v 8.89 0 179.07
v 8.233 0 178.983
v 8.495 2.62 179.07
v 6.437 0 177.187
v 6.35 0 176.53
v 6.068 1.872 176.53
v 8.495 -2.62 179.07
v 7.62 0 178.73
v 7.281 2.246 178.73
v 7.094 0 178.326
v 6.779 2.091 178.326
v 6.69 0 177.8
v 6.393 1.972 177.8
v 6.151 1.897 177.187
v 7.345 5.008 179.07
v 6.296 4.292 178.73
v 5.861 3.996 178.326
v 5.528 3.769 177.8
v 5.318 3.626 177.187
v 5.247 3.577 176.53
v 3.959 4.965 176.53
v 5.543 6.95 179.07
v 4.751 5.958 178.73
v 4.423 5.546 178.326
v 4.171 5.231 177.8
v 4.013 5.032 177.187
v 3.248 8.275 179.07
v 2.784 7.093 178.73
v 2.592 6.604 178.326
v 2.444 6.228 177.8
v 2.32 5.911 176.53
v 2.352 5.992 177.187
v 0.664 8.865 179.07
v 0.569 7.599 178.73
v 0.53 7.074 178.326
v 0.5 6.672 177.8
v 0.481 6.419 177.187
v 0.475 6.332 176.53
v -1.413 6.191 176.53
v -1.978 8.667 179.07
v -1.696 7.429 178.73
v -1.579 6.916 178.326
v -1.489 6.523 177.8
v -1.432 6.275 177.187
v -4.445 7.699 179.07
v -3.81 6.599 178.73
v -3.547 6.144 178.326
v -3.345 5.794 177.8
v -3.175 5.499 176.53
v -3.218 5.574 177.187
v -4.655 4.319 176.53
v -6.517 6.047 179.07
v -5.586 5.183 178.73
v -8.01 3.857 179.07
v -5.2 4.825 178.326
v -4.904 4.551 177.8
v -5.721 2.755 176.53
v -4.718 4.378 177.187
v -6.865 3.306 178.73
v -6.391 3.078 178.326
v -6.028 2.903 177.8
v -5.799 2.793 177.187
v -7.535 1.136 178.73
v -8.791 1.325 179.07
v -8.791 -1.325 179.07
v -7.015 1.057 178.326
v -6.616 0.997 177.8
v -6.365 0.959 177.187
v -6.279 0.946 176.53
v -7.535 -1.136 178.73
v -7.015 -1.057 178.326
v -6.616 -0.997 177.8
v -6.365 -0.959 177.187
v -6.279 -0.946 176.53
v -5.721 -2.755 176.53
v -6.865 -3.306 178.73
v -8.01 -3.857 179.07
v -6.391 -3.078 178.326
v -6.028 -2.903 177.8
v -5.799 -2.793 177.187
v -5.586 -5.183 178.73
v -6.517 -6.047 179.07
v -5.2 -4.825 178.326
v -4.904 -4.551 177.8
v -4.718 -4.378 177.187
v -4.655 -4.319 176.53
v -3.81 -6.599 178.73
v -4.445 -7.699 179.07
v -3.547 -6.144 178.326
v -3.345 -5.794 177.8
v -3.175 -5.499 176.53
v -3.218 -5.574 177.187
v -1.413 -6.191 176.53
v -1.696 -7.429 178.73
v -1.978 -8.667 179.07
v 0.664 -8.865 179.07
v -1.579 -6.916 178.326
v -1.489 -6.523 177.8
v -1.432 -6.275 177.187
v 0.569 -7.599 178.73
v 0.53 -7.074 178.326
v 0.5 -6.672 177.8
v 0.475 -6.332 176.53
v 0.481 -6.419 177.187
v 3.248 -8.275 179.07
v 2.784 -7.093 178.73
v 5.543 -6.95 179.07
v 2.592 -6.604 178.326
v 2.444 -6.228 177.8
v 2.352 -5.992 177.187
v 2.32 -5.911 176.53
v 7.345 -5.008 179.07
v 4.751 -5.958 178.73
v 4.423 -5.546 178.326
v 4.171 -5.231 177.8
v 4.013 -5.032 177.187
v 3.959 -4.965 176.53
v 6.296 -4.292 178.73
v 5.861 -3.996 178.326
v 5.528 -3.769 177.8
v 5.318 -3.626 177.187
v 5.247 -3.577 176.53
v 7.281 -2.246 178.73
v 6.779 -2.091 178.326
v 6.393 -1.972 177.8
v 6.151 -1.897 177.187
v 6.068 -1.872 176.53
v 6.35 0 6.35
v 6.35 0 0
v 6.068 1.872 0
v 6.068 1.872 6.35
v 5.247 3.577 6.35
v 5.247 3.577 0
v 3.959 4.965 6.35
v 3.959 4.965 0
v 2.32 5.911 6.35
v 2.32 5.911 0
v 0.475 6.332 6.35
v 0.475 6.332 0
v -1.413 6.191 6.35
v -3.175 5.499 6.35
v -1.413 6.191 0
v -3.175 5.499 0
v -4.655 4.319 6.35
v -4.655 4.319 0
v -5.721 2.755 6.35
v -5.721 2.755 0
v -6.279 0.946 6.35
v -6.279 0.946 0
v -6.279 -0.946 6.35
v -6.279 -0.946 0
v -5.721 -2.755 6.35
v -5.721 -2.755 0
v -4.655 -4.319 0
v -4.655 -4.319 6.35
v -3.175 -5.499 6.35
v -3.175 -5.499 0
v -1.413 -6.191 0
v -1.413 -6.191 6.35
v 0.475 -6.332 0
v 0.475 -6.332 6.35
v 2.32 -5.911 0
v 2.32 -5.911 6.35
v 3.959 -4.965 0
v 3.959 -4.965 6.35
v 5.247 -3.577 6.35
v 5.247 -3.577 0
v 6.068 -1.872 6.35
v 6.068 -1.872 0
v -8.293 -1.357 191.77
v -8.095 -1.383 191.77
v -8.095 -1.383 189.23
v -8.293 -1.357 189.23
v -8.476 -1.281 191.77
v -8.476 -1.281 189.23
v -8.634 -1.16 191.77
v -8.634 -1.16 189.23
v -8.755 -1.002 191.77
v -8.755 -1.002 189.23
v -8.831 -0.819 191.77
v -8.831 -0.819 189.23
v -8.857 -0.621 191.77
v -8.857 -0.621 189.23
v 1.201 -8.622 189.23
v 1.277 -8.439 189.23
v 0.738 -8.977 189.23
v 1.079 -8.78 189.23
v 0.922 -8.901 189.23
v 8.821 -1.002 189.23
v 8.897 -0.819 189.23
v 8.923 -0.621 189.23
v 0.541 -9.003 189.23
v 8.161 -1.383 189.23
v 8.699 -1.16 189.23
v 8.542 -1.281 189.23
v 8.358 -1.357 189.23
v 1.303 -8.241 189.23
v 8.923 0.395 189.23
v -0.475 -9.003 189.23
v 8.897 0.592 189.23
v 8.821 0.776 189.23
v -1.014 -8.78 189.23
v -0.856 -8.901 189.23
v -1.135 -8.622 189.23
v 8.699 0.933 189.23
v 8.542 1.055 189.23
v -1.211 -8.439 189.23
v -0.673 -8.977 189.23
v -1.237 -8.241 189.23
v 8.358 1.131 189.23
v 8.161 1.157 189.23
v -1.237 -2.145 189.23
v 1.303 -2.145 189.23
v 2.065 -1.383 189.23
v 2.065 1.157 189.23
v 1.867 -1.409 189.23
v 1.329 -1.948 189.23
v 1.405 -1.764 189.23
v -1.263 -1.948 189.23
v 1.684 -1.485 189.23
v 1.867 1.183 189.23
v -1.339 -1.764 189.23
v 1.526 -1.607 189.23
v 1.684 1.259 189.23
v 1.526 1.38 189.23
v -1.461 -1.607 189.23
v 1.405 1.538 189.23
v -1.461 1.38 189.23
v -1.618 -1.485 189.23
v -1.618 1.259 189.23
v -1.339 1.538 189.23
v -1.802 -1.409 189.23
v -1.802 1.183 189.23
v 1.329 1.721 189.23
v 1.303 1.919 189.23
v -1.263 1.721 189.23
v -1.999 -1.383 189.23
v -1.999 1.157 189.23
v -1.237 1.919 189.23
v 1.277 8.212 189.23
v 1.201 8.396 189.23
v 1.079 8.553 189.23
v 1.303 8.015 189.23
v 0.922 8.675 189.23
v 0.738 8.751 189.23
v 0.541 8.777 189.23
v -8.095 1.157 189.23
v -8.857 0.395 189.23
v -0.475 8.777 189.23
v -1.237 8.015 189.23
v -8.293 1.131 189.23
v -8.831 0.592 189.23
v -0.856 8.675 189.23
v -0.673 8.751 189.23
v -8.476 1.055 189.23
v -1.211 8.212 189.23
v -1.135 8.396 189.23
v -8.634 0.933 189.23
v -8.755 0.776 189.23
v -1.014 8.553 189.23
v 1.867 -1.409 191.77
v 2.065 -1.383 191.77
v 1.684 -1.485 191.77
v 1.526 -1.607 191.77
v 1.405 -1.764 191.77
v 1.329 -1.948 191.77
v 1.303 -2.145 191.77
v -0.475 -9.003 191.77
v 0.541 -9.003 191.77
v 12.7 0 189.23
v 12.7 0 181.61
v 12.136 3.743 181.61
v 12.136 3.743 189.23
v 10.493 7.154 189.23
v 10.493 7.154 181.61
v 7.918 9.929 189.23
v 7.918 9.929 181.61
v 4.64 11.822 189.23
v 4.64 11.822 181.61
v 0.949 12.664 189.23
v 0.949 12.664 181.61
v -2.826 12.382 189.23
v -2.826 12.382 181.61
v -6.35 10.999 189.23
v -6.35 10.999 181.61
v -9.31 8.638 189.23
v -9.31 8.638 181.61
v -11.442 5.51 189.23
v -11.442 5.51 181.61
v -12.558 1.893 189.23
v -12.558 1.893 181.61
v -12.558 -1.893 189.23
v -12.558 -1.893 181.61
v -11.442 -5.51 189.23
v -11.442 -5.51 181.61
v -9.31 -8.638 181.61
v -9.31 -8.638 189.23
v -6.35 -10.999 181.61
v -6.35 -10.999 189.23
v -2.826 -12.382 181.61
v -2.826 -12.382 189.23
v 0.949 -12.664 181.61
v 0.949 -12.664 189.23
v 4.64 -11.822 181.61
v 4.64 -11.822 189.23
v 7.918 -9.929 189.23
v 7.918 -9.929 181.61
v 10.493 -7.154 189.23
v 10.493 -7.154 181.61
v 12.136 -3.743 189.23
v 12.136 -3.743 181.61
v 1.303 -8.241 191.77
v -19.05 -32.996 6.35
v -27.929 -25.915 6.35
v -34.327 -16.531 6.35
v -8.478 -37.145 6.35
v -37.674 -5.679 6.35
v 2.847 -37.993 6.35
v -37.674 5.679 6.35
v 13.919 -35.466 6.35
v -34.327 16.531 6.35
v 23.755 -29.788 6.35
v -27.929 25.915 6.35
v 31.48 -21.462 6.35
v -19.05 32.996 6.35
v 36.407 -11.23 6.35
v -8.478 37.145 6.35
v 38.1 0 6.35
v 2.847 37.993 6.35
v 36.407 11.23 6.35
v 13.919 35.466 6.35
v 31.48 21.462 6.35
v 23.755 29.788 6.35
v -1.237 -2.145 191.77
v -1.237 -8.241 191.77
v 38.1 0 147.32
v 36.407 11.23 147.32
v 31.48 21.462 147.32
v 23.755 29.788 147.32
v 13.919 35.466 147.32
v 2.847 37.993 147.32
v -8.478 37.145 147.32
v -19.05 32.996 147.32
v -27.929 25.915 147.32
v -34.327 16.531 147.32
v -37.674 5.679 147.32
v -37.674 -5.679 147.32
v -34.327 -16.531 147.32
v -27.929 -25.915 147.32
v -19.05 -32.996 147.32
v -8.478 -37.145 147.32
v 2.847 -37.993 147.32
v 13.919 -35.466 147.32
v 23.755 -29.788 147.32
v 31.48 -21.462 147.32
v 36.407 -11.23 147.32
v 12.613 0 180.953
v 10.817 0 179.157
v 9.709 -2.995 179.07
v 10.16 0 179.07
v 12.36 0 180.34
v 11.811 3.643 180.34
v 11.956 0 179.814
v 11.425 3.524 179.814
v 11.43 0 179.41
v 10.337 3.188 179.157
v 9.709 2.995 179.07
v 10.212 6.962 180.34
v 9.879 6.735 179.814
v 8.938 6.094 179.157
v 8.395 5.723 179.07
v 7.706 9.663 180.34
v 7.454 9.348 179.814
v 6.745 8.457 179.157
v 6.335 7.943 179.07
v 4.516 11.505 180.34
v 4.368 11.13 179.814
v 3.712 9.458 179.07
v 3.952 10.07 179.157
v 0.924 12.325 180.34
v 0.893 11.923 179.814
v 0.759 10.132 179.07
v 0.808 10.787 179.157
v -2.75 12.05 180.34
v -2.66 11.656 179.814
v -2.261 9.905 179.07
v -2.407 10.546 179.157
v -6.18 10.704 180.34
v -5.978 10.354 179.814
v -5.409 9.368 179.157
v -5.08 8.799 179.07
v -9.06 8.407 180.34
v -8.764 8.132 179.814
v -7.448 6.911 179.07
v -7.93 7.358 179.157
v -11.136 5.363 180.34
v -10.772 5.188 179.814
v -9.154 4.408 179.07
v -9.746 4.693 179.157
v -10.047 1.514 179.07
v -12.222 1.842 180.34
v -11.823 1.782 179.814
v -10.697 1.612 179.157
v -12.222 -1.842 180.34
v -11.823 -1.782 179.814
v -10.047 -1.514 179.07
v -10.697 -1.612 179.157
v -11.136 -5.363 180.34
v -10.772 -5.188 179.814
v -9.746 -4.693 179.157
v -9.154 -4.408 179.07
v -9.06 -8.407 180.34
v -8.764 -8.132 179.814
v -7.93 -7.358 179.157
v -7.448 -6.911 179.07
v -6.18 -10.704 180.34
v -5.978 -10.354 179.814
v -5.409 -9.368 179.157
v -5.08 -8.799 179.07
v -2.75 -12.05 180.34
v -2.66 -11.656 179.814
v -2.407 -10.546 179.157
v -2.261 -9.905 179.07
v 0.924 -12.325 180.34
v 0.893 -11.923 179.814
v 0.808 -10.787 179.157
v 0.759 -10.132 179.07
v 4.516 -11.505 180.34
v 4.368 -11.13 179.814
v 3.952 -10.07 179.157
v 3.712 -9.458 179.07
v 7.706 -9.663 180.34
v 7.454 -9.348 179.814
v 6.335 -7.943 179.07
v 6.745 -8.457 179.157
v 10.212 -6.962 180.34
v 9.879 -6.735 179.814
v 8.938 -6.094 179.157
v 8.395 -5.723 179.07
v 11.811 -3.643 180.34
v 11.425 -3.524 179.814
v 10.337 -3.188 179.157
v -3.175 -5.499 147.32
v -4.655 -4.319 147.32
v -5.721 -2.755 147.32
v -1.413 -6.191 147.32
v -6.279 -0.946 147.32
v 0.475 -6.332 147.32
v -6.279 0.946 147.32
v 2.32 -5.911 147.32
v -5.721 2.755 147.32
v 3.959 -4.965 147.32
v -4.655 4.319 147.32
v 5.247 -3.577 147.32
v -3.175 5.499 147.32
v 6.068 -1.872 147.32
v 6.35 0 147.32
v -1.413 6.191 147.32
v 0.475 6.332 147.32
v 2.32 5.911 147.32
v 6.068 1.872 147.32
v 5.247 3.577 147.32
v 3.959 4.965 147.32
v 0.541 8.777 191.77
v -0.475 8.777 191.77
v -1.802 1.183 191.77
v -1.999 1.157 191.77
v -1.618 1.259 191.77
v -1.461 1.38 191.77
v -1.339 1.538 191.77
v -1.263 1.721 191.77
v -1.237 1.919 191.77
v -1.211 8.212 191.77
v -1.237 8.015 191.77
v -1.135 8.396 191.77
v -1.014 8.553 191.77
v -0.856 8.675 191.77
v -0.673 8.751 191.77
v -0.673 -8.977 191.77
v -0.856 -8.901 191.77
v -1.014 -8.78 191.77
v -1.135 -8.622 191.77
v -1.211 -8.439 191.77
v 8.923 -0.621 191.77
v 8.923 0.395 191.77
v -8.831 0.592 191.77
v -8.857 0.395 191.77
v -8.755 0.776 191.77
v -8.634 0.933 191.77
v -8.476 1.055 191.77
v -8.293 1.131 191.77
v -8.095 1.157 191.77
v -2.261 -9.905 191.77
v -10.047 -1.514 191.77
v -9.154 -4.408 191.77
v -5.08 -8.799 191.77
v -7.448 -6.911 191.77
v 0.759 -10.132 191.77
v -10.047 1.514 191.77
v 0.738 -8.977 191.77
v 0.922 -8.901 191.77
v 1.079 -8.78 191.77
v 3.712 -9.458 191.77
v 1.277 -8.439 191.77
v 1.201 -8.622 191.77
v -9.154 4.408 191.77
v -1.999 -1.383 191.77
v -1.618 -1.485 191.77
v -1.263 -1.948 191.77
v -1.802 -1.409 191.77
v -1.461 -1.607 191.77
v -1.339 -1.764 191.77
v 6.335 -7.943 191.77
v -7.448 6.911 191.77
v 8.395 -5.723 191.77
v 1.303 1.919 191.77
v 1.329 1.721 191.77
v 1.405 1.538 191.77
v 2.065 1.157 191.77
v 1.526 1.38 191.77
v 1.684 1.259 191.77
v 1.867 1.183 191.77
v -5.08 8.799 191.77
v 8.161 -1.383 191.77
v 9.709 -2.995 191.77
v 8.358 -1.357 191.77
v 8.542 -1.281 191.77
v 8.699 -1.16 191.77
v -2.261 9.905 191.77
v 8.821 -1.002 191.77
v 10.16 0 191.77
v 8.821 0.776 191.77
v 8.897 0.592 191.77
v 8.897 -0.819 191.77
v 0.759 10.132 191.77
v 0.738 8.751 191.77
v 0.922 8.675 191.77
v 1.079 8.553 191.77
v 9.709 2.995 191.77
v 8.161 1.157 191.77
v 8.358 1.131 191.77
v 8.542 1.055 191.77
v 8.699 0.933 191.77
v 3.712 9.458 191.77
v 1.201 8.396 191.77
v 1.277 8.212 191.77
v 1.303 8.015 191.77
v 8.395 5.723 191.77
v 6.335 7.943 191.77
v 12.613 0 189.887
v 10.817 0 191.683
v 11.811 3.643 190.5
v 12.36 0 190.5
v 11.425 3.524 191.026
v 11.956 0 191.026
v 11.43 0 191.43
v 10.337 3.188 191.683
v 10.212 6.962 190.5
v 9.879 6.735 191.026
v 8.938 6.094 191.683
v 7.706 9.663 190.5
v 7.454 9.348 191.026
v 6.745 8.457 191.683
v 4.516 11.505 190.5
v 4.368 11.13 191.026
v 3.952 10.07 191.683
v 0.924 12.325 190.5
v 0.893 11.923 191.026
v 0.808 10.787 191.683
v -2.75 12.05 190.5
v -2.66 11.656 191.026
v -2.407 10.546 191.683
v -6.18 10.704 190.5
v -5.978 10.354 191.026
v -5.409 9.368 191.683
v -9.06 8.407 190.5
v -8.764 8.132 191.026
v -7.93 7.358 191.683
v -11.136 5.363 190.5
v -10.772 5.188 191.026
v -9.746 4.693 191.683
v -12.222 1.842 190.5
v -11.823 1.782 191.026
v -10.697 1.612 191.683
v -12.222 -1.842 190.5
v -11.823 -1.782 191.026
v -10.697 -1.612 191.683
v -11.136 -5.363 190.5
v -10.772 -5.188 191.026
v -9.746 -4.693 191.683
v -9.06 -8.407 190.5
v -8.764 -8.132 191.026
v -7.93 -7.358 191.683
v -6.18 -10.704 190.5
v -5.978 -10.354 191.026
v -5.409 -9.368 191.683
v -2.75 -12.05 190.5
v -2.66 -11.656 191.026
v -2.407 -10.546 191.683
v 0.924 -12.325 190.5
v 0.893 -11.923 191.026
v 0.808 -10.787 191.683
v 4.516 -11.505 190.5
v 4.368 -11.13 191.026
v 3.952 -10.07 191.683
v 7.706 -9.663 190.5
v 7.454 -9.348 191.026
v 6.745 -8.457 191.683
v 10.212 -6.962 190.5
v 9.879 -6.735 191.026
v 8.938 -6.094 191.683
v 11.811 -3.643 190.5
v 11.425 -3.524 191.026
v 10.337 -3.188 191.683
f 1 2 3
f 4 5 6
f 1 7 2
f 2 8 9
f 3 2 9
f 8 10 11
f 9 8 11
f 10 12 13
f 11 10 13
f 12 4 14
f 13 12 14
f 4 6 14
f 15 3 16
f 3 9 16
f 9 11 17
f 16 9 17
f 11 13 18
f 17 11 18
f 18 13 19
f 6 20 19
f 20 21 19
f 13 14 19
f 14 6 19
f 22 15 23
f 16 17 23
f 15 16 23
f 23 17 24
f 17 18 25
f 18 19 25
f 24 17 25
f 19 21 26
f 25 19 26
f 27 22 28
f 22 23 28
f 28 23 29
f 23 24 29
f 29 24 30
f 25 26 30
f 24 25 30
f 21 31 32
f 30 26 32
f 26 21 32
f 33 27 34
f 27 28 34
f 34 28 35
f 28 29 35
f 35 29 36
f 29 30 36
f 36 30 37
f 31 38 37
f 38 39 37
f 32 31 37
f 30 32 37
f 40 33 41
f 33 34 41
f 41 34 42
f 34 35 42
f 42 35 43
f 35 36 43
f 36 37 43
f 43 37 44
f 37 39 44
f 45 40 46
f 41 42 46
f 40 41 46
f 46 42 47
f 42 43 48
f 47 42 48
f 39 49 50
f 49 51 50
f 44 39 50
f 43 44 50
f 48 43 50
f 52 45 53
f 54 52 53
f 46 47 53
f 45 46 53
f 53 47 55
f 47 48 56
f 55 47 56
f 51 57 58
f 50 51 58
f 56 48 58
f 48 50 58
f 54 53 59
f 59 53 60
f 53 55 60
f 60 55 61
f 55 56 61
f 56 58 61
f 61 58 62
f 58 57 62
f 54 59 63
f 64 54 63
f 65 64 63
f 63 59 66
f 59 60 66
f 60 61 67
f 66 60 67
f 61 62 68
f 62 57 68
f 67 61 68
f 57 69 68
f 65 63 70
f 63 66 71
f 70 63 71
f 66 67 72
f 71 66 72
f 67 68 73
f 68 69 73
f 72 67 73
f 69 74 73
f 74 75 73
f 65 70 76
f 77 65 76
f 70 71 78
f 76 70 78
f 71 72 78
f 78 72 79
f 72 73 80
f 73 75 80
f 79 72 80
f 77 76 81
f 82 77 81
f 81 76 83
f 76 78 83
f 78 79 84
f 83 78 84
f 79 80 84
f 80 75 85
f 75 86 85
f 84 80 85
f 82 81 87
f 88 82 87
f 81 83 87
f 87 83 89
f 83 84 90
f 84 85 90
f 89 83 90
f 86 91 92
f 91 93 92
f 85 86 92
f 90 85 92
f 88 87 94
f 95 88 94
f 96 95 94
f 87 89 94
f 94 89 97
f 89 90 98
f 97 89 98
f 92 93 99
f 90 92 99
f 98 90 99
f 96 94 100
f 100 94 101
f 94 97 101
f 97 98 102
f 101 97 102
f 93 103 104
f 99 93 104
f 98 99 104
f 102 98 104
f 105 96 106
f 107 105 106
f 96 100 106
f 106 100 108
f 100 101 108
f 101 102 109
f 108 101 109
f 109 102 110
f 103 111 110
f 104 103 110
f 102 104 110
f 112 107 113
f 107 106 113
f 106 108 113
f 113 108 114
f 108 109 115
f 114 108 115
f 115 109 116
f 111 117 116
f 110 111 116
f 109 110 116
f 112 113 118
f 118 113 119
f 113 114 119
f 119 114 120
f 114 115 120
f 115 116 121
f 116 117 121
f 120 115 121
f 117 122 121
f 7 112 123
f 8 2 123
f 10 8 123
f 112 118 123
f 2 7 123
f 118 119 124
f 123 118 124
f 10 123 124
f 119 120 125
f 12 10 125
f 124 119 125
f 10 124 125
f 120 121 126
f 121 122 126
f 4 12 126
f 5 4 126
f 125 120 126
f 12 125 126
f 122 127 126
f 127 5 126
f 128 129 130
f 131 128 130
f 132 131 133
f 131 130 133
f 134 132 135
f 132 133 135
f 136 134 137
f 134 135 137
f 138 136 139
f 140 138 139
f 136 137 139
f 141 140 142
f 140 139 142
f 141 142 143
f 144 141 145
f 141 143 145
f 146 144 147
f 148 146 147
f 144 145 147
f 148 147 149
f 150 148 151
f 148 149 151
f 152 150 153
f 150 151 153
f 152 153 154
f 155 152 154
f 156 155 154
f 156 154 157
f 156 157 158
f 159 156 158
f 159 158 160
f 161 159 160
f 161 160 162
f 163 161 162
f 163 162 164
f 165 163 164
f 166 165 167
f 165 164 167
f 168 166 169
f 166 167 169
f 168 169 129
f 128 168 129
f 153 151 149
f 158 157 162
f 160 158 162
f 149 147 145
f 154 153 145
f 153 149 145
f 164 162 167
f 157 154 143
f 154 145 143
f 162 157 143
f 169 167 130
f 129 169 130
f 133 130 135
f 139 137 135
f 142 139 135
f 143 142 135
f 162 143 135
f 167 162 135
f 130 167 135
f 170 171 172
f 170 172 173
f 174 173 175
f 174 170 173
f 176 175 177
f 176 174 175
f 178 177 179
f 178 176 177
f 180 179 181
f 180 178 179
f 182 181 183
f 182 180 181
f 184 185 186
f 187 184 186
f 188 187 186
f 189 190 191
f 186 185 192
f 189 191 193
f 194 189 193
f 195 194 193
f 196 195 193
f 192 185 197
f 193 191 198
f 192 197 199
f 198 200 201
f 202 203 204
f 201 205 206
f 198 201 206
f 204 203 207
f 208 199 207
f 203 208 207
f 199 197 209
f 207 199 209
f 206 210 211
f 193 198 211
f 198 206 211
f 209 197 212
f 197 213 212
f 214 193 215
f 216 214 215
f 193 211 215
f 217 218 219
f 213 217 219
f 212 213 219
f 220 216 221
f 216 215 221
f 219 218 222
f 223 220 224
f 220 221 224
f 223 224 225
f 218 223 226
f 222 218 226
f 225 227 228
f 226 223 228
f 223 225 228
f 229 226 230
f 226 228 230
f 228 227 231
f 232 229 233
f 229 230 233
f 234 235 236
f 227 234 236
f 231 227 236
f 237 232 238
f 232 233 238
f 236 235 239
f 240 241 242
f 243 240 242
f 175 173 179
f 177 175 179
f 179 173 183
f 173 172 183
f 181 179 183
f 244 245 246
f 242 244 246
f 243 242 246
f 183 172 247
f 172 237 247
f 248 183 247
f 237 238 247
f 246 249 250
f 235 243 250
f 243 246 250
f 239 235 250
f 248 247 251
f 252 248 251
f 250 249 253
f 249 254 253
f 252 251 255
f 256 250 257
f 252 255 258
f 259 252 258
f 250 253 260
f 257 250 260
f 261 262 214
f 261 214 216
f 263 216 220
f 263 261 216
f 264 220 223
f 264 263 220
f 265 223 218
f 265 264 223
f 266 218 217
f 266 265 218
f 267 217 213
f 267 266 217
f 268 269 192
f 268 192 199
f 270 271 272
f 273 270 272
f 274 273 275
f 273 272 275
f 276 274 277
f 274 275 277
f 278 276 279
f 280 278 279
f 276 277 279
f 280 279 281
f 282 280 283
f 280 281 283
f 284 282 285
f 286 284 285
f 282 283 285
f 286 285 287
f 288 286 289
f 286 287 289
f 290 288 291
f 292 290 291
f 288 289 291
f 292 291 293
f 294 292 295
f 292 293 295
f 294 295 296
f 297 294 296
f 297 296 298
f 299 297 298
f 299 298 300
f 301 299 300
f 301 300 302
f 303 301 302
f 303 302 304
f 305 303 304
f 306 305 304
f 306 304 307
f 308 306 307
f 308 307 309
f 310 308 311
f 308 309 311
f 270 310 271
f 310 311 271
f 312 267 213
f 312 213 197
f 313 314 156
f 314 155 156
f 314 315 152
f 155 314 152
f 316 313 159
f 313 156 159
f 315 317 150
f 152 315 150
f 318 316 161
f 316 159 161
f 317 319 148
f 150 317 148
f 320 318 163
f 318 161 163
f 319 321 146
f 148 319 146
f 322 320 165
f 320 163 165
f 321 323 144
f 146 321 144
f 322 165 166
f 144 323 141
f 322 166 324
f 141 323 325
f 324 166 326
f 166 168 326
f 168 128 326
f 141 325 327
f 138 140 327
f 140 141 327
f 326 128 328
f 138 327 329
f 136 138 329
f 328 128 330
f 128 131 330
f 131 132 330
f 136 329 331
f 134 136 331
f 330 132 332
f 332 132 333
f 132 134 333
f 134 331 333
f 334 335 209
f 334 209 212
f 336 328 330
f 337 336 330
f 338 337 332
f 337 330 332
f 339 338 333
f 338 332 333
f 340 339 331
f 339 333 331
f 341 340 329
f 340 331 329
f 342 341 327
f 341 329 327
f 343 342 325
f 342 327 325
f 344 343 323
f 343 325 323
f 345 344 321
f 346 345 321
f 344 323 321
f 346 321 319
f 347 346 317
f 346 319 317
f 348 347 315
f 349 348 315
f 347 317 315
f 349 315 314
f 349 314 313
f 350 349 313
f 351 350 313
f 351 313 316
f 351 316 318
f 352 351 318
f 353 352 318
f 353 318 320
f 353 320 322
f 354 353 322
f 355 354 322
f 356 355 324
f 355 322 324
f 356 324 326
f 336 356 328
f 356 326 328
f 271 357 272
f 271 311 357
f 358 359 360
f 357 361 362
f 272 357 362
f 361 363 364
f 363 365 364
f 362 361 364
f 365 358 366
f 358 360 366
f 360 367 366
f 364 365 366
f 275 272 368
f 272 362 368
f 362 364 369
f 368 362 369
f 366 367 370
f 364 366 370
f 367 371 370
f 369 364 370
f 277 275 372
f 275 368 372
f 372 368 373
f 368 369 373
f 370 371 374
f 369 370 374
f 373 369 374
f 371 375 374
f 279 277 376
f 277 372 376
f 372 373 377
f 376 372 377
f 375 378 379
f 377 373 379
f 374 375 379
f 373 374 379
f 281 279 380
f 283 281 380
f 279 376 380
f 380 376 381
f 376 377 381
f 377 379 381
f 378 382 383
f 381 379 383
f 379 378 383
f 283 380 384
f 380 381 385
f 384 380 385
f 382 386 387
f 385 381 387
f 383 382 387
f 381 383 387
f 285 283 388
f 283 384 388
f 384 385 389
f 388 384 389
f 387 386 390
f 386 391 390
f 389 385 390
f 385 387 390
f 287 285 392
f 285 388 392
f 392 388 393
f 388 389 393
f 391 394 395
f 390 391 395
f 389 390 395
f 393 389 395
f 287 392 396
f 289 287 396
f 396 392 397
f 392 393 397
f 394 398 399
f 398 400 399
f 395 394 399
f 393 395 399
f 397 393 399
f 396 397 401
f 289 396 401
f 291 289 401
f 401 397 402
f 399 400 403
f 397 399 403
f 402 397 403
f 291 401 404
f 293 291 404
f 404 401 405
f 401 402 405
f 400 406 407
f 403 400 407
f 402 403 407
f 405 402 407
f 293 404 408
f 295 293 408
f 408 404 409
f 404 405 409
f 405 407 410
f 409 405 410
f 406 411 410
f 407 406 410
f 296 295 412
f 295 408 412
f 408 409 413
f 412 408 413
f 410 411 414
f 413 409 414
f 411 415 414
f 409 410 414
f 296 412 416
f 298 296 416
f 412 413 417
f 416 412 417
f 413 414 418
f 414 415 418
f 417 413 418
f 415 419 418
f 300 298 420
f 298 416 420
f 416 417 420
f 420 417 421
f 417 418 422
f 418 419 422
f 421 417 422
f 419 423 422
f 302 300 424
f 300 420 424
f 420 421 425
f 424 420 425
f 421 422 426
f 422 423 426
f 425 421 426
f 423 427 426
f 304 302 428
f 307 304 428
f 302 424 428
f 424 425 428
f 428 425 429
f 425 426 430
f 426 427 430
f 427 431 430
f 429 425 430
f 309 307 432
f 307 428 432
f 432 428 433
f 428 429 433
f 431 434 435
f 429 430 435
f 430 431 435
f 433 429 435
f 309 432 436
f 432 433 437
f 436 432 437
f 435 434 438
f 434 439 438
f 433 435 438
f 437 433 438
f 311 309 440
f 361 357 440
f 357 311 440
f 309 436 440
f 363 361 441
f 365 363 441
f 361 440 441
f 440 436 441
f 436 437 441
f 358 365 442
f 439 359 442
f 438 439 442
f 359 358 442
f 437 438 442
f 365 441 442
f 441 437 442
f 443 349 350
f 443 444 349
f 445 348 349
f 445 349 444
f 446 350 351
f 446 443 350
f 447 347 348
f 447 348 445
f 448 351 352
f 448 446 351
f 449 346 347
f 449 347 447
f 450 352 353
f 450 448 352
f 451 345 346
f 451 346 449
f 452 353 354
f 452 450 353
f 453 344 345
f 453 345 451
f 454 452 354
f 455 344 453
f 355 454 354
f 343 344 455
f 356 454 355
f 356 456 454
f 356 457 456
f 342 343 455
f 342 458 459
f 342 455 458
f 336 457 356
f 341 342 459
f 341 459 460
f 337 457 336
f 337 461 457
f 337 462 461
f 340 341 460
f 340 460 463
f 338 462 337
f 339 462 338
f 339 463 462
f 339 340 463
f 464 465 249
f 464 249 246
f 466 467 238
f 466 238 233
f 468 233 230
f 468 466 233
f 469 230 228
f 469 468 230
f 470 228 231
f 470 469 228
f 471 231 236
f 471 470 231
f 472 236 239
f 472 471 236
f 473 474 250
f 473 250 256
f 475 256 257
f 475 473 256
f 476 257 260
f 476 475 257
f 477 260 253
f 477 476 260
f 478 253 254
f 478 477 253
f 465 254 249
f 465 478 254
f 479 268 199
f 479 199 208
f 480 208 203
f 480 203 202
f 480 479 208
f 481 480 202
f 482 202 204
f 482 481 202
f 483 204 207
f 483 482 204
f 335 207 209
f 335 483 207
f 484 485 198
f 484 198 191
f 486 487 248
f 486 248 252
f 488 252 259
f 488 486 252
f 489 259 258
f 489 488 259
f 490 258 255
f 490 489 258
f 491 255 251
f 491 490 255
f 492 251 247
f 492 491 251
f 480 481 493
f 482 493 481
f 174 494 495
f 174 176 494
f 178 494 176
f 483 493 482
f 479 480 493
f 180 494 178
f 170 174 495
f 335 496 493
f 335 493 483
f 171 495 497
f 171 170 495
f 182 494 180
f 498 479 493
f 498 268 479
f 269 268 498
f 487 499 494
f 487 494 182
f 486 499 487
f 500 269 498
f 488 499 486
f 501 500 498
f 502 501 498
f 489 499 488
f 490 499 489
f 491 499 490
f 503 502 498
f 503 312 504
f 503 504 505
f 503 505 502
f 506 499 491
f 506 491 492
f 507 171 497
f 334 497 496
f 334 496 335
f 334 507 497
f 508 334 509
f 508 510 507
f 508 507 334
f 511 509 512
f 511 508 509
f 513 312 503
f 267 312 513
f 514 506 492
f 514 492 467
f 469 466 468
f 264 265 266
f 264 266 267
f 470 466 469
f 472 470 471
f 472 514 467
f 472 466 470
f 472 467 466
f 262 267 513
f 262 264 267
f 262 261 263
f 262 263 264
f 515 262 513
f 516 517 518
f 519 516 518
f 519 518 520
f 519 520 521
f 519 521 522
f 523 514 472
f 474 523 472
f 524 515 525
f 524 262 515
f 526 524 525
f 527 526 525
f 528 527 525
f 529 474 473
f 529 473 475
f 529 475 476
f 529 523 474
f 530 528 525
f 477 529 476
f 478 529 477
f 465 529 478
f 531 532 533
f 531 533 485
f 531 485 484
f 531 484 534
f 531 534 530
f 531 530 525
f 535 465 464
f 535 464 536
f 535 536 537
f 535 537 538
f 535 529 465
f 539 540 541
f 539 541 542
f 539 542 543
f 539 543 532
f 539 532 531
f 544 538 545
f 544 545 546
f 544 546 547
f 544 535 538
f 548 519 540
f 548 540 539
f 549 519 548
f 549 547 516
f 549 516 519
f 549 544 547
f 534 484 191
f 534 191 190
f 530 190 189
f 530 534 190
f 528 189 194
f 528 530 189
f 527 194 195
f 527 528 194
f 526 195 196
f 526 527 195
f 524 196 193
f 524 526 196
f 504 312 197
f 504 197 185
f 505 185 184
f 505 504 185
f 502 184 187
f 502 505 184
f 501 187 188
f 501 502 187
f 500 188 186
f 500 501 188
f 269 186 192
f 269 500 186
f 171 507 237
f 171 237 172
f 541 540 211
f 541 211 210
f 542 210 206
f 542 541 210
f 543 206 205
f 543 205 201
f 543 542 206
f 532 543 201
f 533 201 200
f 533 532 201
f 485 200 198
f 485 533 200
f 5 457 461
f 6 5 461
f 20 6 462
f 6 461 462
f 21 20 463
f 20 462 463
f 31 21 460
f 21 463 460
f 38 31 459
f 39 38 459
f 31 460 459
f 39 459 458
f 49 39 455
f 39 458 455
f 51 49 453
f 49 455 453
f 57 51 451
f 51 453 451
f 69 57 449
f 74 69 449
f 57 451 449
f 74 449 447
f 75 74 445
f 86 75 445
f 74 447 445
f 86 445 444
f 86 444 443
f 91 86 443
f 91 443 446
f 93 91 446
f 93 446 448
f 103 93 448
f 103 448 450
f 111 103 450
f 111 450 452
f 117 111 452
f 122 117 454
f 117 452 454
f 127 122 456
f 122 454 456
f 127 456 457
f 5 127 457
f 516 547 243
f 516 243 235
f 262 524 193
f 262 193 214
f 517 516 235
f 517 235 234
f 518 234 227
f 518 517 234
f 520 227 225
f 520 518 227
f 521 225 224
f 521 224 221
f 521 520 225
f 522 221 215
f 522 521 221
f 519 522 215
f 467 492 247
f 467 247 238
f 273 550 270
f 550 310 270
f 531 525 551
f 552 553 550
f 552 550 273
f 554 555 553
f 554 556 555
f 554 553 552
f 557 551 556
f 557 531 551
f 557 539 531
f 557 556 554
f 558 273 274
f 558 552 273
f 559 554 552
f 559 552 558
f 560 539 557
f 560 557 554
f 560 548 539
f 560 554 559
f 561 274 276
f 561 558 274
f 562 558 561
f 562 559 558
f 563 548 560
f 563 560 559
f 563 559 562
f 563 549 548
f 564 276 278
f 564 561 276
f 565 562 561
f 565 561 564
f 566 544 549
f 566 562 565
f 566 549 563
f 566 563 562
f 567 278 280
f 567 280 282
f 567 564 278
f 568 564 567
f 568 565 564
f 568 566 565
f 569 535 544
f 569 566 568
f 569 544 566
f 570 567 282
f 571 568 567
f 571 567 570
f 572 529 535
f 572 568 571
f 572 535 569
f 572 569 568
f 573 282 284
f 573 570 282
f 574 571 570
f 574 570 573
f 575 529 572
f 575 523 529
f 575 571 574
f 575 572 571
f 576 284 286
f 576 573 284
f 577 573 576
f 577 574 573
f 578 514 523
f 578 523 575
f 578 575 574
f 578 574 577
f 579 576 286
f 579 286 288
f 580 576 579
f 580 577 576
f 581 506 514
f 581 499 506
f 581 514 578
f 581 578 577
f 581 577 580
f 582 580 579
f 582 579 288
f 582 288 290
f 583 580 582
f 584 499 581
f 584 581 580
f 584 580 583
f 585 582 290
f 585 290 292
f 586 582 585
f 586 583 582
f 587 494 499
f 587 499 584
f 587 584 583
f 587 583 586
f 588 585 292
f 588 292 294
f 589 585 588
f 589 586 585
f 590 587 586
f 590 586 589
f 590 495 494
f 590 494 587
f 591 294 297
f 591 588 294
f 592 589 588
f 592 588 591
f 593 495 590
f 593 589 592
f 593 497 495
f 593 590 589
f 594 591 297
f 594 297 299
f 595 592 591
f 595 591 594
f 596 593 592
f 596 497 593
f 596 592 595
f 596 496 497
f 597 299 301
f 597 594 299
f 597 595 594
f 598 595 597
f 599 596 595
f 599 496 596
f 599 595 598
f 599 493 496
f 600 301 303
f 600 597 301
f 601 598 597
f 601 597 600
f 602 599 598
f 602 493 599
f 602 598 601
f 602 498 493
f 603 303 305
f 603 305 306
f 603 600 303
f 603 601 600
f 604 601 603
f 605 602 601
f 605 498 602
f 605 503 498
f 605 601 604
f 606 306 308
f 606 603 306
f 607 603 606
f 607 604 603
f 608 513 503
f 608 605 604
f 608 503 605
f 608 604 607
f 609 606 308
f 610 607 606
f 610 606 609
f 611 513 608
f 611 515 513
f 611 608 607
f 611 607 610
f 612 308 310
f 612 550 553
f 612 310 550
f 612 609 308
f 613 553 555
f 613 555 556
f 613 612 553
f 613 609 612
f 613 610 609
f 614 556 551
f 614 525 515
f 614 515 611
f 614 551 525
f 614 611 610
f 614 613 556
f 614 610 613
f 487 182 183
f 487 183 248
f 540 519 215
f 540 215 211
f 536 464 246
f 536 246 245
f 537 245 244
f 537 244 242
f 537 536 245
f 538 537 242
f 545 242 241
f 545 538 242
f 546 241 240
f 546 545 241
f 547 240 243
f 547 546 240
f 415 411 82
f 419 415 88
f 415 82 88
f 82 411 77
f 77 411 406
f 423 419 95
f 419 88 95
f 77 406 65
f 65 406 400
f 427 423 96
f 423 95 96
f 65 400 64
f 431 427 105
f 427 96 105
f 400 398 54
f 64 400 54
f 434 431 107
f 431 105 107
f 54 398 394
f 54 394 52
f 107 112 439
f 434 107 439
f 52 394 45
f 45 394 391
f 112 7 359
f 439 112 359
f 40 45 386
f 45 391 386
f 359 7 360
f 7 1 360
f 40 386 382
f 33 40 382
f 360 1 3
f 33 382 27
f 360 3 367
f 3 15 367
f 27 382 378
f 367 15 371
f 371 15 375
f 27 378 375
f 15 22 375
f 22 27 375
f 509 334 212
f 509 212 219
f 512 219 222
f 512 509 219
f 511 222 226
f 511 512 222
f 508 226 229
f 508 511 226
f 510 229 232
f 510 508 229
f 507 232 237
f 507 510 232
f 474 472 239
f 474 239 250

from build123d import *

# Parameters (mm, degrees)
SKETCH1_R           = 6.35
BOSS_EXTRUDE1_DEPTH = 6.35
SKETCH2_R           = 38.1
BOSS_EXTRUDE2_DEPTH = 140.97
SKETCH3_R           = 6.35
BOSS_EXTRUDE3_DEPTH = 31.75
SKETCH4_R           = 12.7
BOSS_EXTRUDE4_DEPTH = 12.7
FILLET1_R           = 2.54
CUT_EXTRUDE1_DEPTH  = 2.54


with BuildPart() as part:
    # Sketch1 → Boss-Extrude1 (new body)
    with BuildSketch(Plane.XY):
        Circle(SKETCH1_R)
    extrude(amount=BOSS_EXTRUDE1_DEPTH)

    # Sketch2 → Boss-Extrude2 (add)
    with BuildSketch(Plane.XY.offset(6.35)):
        Circle(SKETCH2_R)
    extrude(amount=BOSS_EXTRUDE2_DEPTH)

    # Sketch3 → Boss-Extrude3 (add)
    with BuildSketch(Plane.XY.offset(147.32)):
        Circle(SKETCH3_R)
    extrude(amount=BOSS_EXTRUDE3_DEPTH)

    # Sketch4 → Boss-Extrude4 (add)
    with BuildSketch(Plane.XY.offset(179.07)):
        Circle(SKETCH4_R)
    extrude(amount=BOSS_EXTRUDE4_DEPTH)

    # Fillet1
    fillet1_edges = [part.edges().sort_by_distance(p)[0] for p in [
        (-6.35, 0, 179.07),
        (-12.7, 0, 179.07),
        (-12.7, 0, 191.77),
    ]]
    fillet(fillet1_edges, radius=FILLET1_R)

    # Sketch5 → Cut-Extrude1 (cut)
    with BuildSketch(Plane.XY.offset(191.77)):
        with BuildLine():
            Line((-0.475346185, 8.776619382), (0.540653815, 8.776619382))
            ThreePointArc((0.540653815, 8.776619382), (1.079469182, 8.55343475), (1.302653815, 8.014619382))
            Line((1.302653815, 8.014619382), (1.302653815, 1.918619382))
            ThreePointArc((1.302653815, 1.918619382), (1.525838448, 1.379804015), (2.064653815, 1.156619382))
            Line((2.064653815, 1.156619382), (8.160653815, 1.156619382))
            ThreePointArc((8.160653815, 1.156619382), (8.699469182, 0.93343475), (8.922653815, 0.394619382))
            Line((8.922653815, 0.394619382), (8.922653815, -0.621380618))
            ThreePointArc((8.922653815, -0.621380618), (8.699469182, -1.160195985), (8.160653815, -1.383380618))
            Line((8.160653815, -1.383380618), (2.064653815, -1.383380618))
            ThreePointArc((2.064653815, -1.383380618), (1.525838448, -1.60656525), (1.302653815, -2.145380618))
            Line((1.302653815, -2.145380618), (1.302653815, -8.241380618))
            ThreePointArc((1.302653815, -8.241380618), (1.079469182, -8.780195985), (0.540653815, -9.003380618))
            Line((0.540653815, -9.003380618), (-0.475346185, -9.003380618))
            ThreePointArc((-0.475346185, -9.003380618), (-1.014161552, -8.780195985), (-1.237346185, -8.241380618))
            Line((-1.237346185, -8.241380618), (-1.237346185, -2.145380618))
            ThreePointArc((-1.237346185, -2.145380618), (-1.460530818, -1.60656525), (-1.999346185, -1.383380618))
            Line((-1.999346185, -1.383380618), (-8.095346185, -1.383380618))
            ThreePointArc((-8.095346185, -1.383380618), (-8.634161552, -1.160195985), (-8.857346185, -0.621380618))
            Line((-8.857346185, -0.621380618), (-8.857346185, 0.394619382))
            ThreePointArc((-8.857346185, 0.394619382), (-8.634161552, 0.93343475), (-8.095346185, 1.156619382))
            Line((-8.095346185, 1.156619382), (-1.999346185, 1.156619382))
            ThreePointArc((-1.999346185, 1.156619382), (-1.460530818, 1.379804015), (-1.237346185, 1.918619382))
            Line((-1.237346185, 1.918619382), (-1.237346185, 8.014619382))
            ThreePointArc((-1.237346185, 8.014619382), (-1.014161552, 8.55343475), (-0.475346185, 8.776619382))
        make_face()
    extrude(amount=-CUT_EXTRUDE1_DEPTH, mode=Mode.SUBTRACT)


solid = part.part
